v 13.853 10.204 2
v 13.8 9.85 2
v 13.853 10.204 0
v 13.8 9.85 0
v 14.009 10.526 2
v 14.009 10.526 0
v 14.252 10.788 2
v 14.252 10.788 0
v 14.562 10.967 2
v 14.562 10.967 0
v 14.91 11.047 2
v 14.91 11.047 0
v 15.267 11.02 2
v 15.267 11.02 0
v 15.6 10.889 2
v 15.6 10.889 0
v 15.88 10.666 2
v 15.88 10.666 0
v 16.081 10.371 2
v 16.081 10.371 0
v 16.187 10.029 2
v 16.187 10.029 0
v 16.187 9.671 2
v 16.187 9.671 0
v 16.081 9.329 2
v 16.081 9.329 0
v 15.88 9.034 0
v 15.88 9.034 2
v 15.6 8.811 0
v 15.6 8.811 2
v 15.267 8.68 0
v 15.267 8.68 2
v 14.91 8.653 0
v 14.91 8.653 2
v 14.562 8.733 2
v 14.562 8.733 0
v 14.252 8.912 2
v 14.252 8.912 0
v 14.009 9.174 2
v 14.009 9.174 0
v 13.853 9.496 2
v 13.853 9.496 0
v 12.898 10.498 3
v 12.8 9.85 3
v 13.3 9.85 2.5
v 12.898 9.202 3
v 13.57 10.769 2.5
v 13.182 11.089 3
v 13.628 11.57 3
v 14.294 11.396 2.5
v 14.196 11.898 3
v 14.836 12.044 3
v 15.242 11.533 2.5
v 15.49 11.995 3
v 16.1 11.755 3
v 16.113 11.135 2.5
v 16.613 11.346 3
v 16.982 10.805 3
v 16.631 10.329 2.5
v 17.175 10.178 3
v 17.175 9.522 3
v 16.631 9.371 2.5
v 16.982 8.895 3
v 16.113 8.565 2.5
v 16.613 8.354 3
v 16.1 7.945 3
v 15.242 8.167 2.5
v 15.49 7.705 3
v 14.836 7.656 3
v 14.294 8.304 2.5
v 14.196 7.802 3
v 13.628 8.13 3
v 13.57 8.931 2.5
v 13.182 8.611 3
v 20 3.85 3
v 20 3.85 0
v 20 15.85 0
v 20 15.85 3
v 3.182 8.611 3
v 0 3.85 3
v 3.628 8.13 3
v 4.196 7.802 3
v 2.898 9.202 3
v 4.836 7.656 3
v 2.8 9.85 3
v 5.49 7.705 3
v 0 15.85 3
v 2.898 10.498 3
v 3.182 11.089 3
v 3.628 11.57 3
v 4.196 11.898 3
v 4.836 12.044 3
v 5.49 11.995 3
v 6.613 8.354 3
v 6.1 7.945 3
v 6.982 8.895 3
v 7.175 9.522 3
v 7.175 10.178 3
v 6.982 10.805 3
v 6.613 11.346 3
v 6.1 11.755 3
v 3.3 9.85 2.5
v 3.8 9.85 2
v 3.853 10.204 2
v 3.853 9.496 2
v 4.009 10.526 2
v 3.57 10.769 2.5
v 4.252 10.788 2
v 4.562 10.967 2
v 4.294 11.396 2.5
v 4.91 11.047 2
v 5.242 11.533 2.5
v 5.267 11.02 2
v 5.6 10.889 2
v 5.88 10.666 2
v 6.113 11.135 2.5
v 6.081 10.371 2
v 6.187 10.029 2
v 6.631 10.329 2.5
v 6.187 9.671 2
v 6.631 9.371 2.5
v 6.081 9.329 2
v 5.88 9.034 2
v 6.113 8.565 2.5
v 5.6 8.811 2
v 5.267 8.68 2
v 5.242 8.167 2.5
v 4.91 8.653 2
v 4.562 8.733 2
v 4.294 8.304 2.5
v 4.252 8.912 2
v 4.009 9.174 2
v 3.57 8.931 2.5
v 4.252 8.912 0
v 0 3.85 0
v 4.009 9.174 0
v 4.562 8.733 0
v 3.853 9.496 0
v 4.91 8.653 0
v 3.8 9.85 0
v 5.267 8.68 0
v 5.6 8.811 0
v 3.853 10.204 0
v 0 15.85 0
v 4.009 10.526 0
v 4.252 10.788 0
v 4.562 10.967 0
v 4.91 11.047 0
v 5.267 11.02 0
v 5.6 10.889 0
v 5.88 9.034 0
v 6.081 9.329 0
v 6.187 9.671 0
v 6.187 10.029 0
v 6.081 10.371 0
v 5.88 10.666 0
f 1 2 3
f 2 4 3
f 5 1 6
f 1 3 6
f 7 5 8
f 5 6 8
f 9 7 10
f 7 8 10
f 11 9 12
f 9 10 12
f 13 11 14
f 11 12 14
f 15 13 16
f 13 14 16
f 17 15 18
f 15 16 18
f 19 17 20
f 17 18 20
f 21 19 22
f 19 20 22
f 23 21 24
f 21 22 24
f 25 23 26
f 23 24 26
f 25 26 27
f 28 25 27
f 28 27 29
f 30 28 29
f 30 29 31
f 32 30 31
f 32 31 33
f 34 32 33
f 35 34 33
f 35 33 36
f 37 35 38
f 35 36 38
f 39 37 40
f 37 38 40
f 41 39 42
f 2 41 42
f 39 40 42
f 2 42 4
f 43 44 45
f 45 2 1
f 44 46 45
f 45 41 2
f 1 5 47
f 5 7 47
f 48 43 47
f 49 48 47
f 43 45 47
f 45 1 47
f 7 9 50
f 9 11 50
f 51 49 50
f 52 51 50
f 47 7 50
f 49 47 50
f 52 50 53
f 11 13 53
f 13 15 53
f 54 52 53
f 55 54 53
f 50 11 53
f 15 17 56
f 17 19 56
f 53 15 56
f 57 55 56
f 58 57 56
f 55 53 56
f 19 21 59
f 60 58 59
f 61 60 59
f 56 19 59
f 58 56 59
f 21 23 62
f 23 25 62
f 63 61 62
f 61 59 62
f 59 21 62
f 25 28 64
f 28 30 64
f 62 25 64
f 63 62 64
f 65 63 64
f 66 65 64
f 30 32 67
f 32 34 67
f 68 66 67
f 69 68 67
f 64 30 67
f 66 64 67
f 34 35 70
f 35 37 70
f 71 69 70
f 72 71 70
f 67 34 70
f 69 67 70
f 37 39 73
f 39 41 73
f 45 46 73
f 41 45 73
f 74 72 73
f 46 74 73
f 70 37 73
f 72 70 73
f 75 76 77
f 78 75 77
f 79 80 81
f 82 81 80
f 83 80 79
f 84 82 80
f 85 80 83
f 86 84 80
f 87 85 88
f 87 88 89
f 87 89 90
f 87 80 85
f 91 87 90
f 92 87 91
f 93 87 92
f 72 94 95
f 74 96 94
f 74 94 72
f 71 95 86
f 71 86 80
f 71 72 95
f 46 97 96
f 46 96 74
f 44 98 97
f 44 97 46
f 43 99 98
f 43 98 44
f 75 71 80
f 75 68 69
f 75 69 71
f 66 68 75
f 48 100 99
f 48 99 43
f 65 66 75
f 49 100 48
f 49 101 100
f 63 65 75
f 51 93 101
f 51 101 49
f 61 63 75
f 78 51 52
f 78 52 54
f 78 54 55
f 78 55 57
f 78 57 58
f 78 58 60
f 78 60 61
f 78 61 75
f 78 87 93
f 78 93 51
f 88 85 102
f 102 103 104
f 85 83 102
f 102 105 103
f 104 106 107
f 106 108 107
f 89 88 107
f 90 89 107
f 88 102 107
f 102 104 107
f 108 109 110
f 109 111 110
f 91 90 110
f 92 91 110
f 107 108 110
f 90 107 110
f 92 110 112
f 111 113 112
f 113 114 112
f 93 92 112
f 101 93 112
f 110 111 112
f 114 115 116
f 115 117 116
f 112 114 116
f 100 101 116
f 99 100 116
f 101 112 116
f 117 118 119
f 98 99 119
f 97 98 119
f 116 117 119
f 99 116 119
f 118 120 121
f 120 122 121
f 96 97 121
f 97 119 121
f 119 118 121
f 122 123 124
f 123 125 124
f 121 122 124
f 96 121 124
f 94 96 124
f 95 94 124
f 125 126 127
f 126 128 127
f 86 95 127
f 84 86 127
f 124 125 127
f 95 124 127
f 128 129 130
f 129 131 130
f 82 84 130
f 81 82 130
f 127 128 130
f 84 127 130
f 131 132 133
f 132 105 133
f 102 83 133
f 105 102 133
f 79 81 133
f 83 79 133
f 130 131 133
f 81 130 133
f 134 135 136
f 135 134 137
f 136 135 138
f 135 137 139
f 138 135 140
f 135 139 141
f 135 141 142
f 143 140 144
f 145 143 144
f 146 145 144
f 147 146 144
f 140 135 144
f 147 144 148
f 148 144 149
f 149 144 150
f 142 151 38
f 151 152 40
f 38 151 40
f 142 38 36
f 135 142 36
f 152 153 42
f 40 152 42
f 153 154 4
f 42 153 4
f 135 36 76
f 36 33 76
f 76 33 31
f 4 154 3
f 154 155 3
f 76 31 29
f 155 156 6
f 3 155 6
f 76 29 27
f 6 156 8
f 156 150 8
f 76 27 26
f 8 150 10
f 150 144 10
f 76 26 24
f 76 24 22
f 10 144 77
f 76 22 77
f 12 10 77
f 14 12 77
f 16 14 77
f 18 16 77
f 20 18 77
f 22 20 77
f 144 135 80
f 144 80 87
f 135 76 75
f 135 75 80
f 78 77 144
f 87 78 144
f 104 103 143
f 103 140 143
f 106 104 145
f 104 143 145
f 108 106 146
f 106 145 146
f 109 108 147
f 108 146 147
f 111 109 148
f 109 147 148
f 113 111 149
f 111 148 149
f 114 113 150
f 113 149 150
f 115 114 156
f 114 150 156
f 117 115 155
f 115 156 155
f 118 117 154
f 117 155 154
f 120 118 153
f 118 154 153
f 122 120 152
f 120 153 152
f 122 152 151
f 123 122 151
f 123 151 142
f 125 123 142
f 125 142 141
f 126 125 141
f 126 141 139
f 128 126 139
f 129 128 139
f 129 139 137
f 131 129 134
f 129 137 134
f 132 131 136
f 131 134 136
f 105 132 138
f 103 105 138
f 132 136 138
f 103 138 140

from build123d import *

# Parameters (mm, degrees)
SCHIZZO1_W                             = 20
SCHIZZO1_H                             = 19.7
ESTRUSIONE_ESTRUSIONE1_DEPTH           = 3
FORO_SVASATO_PER_VITE_M2_2_D           = 2.4
FORO_SVASATO_PER_VITE_M2_2_CSINK_D     = 4.4
FORO_SVASATO_PER_VITE_M2_2_CSINK_ANGLE = 90
SCHIZZO7_W                             = 20
SCHIZZO7_H                             = 3.85
TAGLIO_ESTRUSIONE1_DEPTH               = 10


with BuildPart() as part:
    # Schizzo1 → Estrusione-Estrusione1 (new body)
    with BuildSketch(Plane.XY):
        with Locations((10, 9.85)):
            Rectangle(SCHIZZO1_W, SCHIZZO1_H)
    extrude(amount=ESTRUSIONE_ESTRUSIONE1_DEPTH)

    # Foro svasato per Vite M2-2 (through all)
    with Locations(Plane.XY.offset(3)):
        with Locations((5, 9.85), (15, 9.85)):
            CounterSinkHole(FORO_SVASATO_PER_VITE_M2_2_D / 2, FORO_SVASATO_PER_VITE_M2_2_CSINK_D / 2, counter_sink_angle=FORO_SVASATO_PER_VITE_M2_2_CSINK_ANGLE)

    # Schizzo7 → Taglio-Estrusione1 (cut)
    with BuildSketch(Plane(origin=(0, 0, 0), x_dir=(-1, 0, 0), z_dir=(0, 0, -1))):
        with Locations((-10, 17.775)):
            Rectangle(SCHIZZO7_W, SCHIZZO7_H)
        with Locations((-10, 1.925)):
            Rectangle(SCHIZZO7_W, SCHIZZO7_H)
    extrude(amount=-TAGLIO_ESTRUSIONE1_DEPTH, mode=Mode.SUBTRACT)


solid = part.part
